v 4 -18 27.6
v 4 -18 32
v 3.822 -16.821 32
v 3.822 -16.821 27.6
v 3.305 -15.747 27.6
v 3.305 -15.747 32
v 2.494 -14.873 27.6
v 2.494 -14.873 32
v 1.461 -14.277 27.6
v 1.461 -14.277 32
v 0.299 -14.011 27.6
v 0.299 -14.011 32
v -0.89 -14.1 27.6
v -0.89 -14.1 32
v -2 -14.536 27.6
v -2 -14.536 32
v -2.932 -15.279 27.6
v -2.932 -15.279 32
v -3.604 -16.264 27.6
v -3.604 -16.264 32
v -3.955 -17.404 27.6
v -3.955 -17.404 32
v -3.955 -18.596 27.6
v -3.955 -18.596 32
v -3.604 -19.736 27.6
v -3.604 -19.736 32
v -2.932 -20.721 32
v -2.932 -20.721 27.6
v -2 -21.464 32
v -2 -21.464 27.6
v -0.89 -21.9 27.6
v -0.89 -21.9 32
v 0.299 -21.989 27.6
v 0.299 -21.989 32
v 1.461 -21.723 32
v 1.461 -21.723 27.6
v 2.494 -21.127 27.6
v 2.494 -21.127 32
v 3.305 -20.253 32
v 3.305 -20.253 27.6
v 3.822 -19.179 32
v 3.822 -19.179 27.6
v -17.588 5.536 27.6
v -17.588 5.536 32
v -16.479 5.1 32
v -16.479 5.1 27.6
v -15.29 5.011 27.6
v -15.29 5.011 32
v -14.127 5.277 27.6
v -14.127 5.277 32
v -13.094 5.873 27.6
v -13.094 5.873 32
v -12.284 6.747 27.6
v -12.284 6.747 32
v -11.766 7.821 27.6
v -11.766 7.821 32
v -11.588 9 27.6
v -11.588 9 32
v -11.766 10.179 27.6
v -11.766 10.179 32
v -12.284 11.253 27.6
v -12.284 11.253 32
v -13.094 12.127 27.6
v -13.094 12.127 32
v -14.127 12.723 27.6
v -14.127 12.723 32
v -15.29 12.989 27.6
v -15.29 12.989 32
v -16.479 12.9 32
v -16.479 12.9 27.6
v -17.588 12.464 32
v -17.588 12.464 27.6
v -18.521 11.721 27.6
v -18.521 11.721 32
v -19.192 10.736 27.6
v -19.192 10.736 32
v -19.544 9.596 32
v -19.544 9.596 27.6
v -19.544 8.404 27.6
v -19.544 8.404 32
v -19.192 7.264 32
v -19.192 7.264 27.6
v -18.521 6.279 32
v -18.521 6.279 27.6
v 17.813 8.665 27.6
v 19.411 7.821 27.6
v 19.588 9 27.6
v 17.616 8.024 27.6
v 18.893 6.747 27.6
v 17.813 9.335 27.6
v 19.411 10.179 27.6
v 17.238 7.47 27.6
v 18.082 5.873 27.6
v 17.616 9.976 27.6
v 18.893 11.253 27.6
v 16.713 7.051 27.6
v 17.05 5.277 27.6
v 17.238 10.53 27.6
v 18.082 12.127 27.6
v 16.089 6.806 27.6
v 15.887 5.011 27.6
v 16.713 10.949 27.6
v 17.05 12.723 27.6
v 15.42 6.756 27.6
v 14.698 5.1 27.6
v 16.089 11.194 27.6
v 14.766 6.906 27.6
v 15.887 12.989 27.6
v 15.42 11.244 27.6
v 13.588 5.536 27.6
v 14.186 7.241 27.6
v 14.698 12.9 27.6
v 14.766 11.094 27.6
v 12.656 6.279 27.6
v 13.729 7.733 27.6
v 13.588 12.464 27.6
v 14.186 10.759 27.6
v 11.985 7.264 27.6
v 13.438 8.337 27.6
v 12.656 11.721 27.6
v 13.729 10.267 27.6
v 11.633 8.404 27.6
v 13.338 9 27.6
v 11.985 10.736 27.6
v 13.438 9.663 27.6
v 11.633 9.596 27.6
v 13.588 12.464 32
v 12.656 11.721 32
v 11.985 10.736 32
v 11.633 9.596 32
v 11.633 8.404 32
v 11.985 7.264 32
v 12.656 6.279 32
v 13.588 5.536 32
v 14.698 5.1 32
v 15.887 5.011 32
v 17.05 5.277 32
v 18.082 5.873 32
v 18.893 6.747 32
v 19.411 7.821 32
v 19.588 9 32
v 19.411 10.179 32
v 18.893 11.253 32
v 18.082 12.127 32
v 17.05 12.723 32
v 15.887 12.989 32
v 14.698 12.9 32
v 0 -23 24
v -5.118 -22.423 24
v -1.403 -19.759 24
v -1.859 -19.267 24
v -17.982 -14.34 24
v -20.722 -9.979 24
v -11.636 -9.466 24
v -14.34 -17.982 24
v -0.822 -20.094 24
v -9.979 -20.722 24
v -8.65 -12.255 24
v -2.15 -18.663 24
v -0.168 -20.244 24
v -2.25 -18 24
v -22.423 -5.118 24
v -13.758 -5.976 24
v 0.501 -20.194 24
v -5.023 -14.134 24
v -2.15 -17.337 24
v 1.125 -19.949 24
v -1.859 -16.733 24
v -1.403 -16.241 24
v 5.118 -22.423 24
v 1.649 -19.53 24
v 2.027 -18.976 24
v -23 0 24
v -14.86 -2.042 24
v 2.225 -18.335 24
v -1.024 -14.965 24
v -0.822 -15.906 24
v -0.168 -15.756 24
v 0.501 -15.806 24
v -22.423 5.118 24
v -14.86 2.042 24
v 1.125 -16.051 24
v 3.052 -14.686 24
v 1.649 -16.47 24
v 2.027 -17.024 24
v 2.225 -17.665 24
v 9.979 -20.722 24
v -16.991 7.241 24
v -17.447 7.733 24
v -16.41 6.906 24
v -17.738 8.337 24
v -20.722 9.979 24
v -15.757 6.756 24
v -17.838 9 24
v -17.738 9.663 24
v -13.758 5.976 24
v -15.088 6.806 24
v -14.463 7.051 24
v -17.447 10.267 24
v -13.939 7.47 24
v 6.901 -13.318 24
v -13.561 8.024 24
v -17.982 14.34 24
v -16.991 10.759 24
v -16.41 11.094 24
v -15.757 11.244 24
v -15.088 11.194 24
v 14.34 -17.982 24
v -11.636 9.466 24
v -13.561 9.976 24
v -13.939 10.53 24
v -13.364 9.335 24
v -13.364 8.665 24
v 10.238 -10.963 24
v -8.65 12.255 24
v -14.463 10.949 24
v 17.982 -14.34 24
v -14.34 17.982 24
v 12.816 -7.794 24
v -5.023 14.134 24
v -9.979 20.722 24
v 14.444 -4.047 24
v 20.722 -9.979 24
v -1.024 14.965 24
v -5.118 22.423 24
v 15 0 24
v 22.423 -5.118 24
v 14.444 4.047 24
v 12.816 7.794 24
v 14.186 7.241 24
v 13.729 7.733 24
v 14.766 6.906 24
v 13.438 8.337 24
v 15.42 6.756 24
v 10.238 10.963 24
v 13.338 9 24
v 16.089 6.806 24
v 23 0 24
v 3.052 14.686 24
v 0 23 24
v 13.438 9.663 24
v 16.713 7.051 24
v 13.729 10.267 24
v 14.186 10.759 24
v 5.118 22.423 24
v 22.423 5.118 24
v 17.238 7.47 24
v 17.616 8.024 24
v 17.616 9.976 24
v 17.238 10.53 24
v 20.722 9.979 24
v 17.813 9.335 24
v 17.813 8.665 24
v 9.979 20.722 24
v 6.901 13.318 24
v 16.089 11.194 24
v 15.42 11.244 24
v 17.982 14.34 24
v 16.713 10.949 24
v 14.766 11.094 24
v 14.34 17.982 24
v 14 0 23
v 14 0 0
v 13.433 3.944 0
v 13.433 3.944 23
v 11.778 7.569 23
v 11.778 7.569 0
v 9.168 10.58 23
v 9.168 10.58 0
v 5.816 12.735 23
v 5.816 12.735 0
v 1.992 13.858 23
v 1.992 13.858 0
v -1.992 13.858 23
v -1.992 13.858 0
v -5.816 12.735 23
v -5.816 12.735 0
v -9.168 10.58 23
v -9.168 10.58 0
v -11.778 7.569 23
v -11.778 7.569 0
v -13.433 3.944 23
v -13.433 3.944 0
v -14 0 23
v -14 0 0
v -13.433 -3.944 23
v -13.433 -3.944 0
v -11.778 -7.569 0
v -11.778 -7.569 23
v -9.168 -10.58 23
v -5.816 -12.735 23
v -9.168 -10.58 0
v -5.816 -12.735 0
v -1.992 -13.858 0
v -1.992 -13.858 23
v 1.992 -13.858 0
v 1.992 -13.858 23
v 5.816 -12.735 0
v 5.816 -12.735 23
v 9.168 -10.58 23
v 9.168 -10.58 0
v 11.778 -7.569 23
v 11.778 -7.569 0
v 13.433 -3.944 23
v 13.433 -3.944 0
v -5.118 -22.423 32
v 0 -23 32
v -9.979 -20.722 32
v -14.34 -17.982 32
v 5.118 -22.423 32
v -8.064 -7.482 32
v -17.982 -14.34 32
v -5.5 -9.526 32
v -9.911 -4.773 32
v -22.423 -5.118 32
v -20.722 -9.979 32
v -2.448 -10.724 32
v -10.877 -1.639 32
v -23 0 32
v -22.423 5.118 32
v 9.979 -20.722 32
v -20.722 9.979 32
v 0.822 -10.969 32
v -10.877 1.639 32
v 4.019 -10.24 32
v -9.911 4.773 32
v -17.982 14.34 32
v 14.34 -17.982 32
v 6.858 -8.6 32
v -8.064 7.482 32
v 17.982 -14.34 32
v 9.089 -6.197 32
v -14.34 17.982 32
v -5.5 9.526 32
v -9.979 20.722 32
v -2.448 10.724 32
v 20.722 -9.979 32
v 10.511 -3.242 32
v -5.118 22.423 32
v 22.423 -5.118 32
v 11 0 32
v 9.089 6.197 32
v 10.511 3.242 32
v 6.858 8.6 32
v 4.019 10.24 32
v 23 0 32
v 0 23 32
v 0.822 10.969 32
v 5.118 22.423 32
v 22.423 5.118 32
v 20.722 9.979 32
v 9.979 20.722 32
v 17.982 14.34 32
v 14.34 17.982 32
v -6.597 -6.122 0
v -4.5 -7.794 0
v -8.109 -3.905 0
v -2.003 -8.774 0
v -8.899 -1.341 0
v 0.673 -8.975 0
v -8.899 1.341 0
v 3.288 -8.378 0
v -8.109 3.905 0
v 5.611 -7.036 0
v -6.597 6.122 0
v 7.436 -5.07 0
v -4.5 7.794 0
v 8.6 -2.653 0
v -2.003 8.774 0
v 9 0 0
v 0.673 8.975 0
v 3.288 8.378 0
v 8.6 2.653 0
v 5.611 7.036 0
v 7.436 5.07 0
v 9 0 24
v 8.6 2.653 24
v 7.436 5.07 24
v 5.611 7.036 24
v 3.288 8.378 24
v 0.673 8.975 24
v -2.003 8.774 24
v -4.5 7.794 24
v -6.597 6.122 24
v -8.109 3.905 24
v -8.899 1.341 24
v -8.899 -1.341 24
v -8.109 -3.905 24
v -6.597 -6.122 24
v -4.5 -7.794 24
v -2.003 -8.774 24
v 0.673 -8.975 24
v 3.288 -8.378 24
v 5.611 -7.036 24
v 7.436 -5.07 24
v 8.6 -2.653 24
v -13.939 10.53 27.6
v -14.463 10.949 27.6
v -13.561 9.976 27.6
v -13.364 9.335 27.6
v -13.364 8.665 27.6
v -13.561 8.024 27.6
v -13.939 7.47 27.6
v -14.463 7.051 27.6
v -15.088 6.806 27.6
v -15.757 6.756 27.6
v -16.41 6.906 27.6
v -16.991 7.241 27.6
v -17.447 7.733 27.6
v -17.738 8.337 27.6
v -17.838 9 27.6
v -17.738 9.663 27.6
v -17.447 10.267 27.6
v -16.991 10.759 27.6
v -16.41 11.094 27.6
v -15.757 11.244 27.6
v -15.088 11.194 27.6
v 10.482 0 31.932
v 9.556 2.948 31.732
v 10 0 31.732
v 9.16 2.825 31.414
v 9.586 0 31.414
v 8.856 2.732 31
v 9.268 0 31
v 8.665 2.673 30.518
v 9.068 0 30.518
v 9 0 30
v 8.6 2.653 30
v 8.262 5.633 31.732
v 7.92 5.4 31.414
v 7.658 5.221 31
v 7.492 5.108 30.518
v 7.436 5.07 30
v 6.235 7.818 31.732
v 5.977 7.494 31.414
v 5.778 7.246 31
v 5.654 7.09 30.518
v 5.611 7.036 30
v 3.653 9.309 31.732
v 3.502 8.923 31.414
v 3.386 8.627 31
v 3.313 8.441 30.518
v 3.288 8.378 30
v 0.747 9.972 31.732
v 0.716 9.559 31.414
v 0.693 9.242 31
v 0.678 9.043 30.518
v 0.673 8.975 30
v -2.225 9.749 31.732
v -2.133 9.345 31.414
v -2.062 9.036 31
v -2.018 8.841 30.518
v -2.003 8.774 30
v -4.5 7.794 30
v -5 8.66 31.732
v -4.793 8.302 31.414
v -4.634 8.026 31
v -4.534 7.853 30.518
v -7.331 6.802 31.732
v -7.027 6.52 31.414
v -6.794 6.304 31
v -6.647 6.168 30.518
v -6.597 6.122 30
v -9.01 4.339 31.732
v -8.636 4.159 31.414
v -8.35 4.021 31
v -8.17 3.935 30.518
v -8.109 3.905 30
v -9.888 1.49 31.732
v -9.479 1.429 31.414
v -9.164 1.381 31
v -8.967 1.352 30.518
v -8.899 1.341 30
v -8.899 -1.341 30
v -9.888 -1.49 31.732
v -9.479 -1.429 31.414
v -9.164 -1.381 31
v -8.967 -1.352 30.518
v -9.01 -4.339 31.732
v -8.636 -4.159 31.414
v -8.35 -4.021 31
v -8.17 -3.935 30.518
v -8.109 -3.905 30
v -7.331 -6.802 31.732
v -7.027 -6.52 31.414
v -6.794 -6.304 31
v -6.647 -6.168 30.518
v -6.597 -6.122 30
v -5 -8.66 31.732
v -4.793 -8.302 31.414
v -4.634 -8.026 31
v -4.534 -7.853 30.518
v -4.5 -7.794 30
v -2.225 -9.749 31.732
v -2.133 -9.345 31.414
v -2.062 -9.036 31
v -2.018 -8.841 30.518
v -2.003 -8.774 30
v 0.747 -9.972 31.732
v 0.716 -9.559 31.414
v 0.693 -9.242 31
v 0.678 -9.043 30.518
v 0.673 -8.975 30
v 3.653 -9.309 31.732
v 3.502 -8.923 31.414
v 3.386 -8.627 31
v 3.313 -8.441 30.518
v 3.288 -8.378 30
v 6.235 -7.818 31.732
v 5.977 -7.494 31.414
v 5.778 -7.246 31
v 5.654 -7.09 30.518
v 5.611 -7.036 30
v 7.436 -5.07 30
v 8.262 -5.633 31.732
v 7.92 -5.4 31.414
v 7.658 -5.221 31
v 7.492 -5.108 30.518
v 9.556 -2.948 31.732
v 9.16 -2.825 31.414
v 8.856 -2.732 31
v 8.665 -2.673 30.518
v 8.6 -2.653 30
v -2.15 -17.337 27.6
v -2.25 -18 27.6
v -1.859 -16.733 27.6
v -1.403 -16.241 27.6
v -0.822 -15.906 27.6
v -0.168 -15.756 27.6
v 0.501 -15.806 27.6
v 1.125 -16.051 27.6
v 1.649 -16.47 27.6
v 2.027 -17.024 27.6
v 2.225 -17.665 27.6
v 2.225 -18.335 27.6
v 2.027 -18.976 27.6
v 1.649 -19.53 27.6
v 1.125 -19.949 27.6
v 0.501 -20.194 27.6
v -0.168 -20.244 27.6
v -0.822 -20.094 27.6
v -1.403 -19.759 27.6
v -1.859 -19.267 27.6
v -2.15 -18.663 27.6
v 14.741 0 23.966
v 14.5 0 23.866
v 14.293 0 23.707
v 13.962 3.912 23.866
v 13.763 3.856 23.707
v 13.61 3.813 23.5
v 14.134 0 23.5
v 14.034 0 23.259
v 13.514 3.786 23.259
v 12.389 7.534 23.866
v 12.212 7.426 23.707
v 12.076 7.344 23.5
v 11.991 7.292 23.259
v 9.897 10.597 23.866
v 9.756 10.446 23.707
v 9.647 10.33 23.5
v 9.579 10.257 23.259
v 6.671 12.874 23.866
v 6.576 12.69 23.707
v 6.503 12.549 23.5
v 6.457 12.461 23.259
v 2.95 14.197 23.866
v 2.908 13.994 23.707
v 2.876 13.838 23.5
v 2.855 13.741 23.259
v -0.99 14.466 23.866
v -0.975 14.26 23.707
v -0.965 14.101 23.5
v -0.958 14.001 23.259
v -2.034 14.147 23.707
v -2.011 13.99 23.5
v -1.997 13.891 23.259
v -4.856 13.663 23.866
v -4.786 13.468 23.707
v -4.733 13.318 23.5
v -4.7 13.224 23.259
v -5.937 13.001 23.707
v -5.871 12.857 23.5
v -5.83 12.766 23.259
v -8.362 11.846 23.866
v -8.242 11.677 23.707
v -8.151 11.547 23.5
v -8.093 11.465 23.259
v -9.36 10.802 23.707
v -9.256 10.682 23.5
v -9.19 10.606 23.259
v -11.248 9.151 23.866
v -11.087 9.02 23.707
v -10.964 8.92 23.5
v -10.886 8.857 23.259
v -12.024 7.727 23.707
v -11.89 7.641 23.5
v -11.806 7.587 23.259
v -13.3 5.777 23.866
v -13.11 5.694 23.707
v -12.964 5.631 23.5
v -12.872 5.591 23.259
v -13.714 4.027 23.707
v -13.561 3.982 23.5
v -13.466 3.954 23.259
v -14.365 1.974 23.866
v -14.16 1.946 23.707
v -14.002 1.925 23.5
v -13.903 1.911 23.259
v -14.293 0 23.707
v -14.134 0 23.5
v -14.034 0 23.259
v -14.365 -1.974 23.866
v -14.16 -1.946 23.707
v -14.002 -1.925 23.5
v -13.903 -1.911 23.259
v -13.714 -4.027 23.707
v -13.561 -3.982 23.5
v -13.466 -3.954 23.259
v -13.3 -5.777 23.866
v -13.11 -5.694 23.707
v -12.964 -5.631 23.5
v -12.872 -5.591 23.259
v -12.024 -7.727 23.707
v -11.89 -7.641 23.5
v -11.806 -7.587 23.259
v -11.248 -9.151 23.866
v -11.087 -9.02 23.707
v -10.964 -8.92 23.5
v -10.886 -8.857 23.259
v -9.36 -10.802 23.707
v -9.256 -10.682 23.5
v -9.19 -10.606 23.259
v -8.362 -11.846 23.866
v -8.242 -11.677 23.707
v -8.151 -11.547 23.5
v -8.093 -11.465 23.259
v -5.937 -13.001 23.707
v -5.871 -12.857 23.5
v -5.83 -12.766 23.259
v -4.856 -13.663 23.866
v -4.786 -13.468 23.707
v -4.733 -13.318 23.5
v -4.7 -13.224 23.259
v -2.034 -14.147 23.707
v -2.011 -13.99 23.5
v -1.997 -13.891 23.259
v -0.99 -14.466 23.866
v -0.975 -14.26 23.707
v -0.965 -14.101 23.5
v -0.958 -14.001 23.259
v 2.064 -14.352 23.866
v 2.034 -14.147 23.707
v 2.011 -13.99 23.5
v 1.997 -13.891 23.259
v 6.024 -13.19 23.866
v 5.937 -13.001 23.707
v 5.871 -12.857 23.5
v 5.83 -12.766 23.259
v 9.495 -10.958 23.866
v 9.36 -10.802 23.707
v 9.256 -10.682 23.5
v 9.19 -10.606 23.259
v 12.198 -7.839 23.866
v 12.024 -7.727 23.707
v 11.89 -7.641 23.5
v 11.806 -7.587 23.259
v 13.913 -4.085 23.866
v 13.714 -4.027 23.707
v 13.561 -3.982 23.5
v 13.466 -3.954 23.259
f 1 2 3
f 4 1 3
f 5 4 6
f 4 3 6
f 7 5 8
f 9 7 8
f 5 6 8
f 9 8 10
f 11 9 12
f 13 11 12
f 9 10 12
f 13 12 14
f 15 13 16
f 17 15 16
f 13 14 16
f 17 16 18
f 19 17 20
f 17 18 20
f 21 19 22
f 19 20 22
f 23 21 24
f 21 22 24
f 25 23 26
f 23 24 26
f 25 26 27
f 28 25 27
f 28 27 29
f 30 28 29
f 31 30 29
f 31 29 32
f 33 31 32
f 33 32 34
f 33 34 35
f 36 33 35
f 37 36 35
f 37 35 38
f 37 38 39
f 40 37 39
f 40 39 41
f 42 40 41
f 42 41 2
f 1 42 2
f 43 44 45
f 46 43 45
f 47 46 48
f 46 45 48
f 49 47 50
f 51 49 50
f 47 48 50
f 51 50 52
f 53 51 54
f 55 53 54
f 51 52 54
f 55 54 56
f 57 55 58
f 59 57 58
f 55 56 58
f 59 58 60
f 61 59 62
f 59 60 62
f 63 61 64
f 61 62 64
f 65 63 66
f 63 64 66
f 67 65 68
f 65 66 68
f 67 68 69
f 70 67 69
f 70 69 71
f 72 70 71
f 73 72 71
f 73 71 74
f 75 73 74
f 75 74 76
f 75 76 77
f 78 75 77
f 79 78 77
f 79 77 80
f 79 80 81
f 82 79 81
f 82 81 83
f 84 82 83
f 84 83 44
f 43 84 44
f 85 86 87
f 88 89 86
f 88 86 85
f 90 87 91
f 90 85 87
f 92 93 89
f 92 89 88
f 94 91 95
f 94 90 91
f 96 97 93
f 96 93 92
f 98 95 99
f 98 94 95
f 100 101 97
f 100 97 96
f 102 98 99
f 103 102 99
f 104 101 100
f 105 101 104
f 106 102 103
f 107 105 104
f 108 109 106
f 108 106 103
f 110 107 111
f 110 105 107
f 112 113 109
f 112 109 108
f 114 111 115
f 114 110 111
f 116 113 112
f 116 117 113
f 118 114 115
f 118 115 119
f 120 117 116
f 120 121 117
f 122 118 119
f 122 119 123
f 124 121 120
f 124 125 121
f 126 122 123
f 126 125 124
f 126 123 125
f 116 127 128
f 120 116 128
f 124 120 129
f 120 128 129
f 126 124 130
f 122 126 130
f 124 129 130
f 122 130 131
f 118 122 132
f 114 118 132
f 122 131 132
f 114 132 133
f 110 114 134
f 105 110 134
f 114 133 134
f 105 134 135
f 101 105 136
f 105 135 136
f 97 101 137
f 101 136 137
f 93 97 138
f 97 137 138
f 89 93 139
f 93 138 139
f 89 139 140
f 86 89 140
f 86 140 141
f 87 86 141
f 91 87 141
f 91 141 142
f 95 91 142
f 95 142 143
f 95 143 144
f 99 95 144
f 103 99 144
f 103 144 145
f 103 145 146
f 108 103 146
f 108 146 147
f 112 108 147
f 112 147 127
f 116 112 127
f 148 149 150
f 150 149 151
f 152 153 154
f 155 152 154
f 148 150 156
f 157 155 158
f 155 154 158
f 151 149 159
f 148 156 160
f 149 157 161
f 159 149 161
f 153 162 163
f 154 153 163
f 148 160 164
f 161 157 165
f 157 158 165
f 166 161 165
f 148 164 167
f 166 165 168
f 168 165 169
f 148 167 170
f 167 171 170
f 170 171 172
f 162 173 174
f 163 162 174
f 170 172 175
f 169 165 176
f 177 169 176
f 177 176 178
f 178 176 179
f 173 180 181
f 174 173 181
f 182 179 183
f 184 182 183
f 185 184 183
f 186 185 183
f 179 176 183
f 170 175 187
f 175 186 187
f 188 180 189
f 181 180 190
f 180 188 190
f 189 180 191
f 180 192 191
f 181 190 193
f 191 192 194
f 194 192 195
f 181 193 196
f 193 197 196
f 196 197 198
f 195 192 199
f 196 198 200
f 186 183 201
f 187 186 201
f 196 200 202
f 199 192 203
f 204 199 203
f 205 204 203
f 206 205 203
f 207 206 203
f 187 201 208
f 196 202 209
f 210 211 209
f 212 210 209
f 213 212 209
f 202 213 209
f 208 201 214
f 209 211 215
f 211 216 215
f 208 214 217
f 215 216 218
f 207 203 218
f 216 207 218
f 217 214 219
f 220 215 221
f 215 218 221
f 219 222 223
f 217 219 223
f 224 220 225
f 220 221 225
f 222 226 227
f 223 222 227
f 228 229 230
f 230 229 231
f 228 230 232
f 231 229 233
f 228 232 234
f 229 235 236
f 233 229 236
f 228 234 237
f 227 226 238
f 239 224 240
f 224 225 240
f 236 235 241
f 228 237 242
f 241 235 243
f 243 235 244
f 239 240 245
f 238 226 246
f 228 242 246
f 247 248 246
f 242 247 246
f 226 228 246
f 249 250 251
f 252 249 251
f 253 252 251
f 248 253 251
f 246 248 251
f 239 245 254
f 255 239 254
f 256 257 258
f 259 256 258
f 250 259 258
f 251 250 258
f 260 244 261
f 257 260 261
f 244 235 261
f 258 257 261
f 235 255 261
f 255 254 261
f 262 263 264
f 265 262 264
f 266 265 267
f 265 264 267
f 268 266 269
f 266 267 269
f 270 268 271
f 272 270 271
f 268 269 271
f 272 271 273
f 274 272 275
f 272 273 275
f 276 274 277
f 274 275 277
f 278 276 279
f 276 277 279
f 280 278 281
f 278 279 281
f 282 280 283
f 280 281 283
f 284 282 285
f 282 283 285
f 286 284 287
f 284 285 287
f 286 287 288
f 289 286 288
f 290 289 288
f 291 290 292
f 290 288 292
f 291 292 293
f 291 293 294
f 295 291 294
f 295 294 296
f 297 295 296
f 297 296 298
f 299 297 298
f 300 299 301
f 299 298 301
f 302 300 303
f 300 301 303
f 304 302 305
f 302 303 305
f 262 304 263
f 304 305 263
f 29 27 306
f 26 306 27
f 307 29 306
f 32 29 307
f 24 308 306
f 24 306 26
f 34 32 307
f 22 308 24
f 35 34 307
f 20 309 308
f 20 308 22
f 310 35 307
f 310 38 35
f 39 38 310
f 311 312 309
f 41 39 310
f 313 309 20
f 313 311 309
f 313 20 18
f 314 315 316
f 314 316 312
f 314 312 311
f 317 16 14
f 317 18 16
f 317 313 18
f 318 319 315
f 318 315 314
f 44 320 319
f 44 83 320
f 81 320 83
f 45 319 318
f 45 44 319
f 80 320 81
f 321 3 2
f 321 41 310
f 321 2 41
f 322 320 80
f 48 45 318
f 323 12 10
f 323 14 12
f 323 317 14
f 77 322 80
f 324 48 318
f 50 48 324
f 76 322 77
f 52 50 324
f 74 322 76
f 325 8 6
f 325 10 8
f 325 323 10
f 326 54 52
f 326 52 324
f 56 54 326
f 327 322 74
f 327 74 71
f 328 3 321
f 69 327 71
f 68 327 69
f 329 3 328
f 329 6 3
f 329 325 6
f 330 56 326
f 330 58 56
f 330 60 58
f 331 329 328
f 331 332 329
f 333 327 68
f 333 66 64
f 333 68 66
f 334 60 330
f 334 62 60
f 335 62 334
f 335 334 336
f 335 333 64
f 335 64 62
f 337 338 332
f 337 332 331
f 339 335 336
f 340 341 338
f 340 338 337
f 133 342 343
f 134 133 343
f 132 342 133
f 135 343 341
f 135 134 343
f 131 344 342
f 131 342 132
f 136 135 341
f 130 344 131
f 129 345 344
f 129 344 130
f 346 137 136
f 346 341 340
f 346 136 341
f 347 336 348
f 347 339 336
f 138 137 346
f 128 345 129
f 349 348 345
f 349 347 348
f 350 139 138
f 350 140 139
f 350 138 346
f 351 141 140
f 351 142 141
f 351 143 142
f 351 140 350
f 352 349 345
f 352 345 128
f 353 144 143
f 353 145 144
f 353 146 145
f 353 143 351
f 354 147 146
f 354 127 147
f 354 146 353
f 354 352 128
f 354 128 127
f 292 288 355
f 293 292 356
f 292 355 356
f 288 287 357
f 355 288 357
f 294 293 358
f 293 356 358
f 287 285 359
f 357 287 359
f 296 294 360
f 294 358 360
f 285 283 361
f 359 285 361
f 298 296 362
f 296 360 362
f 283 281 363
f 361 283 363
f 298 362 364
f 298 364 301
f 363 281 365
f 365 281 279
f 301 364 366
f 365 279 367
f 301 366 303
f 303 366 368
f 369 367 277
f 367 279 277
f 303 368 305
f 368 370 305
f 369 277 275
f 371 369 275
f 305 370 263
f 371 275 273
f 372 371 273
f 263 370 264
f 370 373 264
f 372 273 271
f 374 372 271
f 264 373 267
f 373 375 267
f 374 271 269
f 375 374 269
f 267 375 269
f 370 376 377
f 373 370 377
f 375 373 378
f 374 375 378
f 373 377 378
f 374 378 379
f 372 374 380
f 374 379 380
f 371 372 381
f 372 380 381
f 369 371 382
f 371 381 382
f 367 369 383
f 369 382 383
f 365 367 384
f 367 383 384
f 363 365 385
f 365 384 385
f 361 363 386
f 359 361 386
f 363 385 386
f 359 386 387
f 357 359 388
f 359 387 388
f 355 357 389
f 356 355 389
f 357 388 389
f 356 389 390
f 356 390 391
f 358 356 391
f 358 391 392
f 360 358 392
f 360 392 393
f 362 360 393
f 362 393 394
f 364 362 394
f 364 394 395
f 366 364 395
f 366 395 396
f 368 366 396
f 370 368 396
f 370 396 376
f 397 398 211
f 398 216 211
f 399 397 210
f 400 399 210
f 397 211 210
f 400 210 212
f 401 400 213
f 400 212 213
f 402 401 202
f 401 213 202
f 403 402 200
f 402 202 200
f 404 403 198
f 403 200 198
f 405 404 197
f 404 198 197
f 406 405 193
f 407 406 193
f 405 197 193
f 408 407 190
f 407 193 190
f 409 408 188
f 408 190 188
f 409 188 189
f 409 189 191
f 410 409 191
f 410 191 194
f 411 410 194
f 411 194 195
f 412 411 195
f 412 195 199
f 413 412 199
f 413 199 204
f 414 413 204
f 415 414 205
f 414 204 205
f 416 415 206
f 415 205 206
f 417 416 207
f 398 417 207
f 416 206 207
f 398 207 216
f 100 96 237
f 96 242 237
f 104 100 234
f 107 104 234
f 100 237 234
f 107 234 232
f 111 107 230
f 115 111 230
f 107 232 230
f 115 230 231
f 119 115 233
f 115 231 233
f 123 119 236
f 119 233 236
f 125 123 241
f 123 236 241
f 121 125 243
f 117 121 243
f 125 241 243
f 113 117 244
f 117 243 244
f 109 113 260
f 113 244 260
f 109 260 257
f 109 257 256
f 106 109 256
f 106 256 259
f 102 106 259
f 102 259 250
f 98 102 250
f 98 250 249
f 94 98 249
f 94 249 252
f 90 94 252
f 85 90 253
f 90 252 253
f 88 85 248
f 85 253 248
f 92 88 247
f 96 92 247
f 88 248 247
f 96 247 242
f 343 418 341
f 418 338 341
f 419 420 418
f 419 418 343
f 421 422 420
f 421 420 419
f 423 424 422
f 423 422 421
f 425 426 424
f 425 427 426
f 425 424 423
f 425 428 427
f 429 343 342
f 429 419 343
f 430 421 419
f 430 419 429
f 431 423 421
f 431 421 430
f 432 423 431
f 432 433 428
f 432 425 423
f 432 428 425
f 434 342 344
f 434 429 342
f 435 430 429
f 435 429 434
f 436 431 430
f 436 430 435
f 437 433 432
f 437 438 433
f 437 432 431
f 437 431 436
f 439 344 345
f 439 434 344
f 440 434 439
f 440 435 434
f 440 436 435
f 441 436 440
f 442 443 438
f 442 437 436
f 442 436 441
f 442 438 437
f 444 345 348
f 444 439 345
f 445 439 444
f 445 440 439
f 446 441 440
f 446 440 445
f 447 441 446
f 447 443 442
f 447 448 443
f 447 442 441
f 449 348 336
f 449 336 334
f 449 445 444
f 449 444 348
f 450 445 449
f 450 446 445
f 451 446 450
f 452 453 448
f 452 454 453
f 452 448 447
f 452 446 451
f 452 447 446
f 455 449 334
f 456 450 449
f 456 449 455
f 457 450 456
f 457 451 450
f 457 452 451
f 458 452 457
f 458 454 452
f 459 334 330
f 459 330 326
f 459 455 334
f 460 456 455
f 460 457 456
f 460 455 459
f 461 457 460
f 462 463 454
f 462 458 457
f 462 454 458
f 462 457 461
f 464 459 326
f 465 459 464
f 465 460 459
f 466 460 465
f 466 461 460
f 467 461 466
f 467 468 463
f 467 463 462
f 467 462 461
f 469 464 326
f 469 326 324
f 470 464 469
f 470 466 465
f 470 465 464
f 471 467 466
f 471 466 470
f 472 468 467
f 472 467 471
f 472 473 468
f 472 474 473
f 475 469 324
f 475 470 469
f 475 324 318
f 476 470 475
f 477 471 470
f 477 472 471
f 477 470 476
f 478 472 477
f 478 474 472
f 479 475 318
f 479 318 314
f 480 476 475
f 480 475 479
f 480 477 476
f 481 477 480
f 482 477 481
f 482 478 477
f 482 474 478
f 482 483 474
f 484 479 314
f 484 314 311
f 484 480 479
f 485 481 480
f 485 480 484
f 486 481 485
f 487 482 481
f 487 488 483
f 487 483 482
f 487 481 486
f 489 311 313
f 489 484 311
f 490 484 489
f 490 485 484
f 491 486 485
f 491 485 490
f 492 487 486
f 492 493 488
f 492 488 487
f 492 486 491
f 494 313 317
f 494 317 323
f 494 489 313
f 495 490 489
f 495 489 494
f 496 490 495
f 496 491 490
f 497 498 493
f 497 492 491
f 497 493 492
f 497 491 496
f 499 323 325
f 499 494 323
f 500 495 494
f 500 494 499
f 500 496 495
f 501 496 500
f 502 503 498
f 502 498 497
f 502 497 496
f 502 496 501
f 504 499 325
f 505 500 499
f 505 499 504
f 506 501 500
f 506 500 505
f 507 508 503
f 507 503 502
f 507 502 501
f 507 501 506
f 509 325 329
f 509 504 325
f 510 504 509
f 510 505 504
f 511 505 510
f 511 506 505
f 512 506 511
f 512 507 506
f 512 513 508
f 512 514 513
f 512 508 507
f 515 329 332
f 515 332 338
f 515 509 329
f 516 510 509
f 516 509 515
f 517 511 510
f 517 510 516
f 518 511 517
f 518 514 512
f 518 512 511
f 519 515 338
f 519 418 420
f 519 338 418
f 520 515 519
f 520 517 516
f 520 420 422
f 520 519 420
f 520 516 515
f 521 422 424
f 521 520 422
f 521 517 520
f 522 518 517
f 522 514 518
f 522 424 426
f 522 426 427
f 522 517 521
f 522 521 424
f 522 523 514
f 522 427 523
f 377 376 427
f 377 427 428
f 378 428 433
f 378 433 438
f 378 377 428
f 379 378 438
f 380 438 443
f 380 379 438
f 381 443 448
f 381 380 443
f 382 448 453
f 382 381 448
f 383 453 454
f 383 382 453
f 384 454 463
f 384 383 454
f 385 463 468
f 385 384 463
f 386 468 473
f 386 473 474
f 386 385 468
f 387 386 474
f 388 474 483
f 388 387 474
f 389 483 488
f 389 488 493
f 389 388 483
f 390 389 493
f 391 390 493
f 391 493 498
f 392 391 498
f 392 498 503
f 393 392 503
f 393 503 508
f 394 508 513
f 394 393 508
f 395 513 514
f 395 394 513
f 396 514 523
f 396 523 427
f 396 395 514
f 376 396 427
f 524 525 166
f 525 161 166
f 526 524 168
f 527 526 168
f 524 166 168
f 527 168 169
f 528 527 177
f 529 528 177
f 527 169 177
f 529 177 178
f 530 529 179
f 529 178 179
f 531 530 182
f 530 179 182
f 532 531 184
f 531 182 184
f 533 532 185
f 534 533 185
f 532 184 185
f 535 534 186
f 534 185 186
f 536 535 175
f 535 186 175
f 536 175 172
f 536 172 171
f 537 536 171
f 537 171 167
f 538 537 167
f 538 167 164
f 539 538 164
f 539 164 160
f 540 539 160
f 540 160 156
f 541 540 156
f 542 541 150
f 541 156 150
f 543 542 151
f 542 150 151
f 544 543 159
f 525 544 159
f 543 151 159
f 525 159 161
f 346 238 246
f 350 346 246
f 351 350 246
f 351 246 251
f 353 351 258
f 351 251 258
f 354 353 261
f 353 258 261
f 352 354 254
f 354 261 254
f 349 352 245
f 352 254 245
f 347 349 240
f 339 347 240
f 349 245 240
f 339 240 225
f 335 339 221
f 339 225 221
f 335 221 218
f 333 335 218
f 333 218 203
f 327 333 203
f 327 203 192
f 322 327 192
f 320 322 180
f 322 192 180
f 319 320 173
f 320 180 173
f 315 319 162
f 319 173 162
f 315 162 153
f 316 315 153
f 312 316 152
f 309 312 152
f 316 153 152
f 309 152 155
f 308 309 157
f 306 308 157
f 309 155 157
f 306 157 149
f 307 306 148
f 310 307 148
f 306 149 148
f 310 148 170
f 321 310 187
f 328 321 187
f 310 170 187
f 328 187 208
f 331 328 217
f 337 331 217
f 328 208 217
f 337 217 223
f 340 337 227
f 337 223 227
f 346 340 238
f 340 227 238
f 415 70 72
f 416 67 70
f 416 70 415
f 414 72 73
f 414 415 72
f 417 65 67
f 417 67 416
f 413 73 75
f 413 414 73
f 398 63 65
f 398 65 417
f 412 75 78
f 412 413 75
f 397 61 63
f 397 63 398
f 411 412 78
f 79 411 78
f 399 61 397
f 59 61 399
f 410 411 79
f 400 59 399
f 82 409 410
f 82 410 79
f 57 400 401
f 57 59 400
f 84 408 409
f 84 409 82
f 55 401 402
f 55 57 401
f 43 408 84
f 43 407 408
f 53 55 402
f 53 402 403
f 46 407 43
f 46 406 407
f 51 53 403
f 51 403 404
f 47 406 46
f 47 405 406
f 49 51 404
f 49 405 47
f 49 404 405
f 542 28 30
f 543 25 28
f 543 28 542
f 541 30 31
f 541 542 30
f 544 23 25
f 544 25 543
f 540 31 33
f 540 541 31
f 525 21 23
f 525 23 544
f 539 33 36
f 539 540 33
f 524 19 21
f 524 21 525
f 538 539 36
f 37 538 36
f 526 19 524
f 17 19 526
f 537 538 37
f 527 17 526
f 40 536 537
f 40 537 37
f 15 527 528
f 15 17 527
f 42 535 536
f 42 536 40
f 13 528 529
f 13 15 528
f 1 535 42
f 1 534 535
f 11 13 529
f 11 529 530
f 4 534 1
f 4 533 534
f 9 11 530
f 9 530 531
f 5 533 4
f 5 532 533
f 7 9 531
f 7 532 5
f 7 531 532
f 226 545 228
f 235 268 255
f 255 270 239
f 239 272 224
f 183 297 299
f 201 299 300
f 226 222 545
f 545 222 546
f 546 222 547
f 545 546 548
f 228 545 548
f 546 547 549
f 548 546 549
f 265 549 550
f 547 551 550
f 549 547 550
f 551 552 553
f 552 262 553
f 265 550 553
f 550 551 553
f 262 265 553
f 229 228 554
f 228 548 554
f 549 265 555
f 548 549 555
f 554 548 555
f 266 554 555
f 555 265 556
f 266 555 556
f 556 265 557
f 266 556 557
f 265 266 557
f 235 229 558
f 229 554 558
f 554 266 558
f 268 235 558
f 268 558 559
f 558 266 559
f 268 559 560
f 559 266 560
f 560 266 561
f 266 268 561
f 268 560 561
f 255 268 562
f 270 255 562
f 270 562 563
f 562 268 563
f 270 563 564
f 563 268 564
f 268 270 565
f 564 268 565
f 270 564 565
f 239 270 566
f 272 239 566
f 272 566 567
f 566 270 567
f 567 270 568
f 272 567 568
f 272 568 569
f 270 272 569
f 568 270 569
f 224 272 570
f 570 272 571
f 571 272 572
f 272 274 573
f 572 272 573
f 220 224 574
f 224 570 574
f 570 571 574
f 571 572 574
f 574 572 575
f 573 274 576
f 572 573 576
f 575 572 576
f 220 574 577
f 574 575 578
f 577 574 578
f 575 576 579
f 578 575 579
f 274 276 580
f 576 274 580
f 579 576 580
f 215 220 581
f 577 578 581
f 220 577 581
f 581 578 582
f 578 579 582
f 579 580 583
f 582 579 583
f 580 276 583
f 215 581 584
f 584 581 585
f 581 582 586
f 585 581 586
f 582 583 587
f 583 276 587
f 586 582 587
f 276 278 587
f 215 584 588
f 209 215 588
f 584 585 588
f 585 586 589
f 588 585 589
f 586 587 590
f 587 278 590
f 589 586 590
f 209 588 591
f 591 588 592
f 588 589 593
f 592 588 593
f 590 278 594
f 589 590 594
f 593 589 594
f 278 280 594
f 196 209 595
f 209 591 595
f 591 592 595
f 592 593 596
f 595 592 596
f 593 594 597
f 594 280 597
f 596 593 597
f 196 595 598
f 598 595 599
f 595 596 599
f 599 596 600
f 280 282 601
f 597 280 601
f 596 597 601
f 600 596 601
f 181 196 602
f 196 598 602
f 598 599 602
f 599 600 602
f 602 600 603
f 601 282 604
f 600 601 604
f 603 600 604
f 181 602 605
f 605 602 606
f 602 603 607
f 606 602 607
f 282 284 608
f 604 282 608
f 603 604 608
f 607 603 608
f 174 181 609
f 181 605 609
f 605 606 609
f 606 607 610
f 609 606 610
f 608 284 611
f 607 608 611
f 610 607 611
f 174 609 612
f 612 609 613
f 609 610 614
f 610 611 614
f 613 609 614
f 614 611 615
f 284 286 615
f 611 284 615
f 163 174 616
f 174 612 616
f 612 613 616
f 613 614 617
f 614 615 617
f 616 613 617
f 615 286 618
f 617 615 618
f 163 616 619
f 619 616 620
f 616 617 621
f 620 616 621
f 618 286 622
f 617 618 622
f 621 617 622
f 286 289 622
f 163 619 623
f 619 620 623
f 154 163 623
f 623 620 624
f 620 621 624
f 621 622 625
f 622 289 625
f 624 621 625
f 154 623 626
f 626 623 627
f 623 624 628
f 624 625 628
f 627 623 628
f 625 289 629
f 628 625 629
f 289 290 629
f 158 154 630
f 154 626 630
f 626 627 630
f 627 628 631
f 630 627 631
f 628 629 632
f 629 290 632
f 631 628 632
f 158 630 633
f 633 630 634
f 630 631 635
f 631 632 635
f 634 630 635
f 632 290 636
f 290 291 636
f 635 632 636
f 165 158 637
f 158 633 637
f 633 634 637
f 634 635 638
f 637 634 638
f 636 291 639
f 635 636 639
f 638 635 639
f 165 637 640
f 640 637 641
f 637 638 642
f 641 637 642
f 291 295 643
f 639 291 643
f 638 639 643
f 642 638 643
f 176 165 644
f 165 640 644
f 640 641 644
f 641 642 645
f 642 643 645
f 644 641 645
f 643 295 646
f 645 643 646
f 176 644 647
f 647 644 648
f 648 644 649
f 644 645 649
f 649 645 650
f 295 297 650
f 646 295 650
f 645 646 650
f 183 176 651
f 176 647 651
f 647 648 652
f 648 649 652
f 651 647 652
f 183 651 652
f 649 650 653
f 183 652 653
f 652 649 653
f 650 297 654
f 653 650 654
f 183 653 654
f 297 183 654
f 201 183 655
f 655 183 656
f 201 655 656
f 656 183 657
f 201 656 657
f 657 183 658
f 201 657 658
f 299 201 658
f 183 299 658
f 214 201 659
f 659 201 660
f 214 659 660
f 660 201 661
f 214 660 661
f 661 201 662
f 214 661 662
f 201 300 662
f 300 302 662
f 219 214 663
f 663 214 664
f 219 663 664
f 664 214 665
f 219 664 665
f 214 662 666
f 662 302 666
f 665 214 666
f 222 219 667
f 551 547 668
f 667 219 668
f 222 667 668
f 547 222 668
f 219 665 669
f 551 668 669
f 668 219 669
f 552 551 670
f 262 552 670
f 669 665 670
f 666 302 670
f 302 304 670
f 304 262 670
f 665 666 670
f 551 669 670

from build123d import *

# Parameters (mm, degrees)
SKETCH1_R                                           = 14
BOSS_EXTRUDE1_DEPTH                                 = 24
SKETCH2_R                                           = 23
SKETCH2_R_2                                         = 9
BOSS_EXTRUDE2_DEPTH                                 = 8
SKETCH3_R                                           = 9
CUT_EXTRUDE1_DEPTH                                  = 41.422765863
CBORE_FOR_M4_HEX_SOCKET_HEAD_CAP_SCREW1_D           = 4.5
CBORE_FOR_M4_HEX_SOCKET_HEAD_CAP_SCREW1_CBORE_D     = 8
CBORE_FOR_M4_HEX_SOCKET_HEAD_CAP_SCREW1_CBORE_DEPTH = 4.4
CIRPATTERN1_COUNT                                   = 3
FILLET1_R                                           = 2
FILLET2_R                                           = 1


with BuildPart() as part:
    # Sketch1 → Boss-Extrude1 (new body)
    with BuildSketch(Plane.XY):
        Circle(SKETCH1_R)
    extrude(amount=BOSS_EXTRUDE1_DEPTH)

    # Sketch2 → Boss-Extrude2 (add)
    with BuildSketch(Plane.XY.offset(24)):
        Circle(SKETCH2_R)
        Circle(SKETCH2_R_2, mode=Mode.SUBTRACT)
    extrude(amount=BOSS_EXTRUDE2_DEPTH)

    # Sketch3 → Cut-Extrude1 (cut, through all)
    with BuildSketch(Plane.XY.offset(24)):
        Circle(SKETCH3_R)
    extrude(amount=-CUT_EXTRUDE1_DEPTH, mode=Mode.SUBTRACT)

    # CBORE for M4 Hex Socket Head Cap Screw1 (through all)
    with Locations(Plane.XY.offset(32)):
        with Locations((0, -18)):
            cbore_for_m4_hex_socket_head_cap_screw1 = CounterBoreHole(CBORE_FOR_M4_HEX_SOCKET_HEAD_CAP_SCREW1_D / 2, CBORE_FOR_M4_HEX_SOCKET_HEAD_CAP_SCREW1_CBORE_D / 2, CBORE_FOR_M4_HEX_SOCKET_HEAD_CAP_SCREW1_CBORE_DEPTH)

    # CirPattern1: CBORE for M4 Hex Socket Head Cap Screw1 ×3 about axis
    cirpattern1_axis = Axis((0, 0, 0), (0, 0, 1))
    for i in range(1, CIRPATTERN1_COUNT):
        add(cbore_for_m4_hex_socket_head_cap_screw1.rotate(cirpattern1_axis, i * 360 / CIRPATTERN1_COUNT), mode=Mode.SUBTRACT)

    # Fillet1
    fillet1_edges = [part.edges().sort_by_distance(p)[0] for p in [
        (-9, 0, 32),
    ]]
    fillet(fillet1_edges, radius=FILLET1_R)

    # Fillet2
    fillet2_edges = [part.edges().sort_by_distance(p)[0] for p in [
        (-14, 0, 24),
    ]]
    fillet(fillet2_edges, radius=FILLET2_R)


solid = part.part
